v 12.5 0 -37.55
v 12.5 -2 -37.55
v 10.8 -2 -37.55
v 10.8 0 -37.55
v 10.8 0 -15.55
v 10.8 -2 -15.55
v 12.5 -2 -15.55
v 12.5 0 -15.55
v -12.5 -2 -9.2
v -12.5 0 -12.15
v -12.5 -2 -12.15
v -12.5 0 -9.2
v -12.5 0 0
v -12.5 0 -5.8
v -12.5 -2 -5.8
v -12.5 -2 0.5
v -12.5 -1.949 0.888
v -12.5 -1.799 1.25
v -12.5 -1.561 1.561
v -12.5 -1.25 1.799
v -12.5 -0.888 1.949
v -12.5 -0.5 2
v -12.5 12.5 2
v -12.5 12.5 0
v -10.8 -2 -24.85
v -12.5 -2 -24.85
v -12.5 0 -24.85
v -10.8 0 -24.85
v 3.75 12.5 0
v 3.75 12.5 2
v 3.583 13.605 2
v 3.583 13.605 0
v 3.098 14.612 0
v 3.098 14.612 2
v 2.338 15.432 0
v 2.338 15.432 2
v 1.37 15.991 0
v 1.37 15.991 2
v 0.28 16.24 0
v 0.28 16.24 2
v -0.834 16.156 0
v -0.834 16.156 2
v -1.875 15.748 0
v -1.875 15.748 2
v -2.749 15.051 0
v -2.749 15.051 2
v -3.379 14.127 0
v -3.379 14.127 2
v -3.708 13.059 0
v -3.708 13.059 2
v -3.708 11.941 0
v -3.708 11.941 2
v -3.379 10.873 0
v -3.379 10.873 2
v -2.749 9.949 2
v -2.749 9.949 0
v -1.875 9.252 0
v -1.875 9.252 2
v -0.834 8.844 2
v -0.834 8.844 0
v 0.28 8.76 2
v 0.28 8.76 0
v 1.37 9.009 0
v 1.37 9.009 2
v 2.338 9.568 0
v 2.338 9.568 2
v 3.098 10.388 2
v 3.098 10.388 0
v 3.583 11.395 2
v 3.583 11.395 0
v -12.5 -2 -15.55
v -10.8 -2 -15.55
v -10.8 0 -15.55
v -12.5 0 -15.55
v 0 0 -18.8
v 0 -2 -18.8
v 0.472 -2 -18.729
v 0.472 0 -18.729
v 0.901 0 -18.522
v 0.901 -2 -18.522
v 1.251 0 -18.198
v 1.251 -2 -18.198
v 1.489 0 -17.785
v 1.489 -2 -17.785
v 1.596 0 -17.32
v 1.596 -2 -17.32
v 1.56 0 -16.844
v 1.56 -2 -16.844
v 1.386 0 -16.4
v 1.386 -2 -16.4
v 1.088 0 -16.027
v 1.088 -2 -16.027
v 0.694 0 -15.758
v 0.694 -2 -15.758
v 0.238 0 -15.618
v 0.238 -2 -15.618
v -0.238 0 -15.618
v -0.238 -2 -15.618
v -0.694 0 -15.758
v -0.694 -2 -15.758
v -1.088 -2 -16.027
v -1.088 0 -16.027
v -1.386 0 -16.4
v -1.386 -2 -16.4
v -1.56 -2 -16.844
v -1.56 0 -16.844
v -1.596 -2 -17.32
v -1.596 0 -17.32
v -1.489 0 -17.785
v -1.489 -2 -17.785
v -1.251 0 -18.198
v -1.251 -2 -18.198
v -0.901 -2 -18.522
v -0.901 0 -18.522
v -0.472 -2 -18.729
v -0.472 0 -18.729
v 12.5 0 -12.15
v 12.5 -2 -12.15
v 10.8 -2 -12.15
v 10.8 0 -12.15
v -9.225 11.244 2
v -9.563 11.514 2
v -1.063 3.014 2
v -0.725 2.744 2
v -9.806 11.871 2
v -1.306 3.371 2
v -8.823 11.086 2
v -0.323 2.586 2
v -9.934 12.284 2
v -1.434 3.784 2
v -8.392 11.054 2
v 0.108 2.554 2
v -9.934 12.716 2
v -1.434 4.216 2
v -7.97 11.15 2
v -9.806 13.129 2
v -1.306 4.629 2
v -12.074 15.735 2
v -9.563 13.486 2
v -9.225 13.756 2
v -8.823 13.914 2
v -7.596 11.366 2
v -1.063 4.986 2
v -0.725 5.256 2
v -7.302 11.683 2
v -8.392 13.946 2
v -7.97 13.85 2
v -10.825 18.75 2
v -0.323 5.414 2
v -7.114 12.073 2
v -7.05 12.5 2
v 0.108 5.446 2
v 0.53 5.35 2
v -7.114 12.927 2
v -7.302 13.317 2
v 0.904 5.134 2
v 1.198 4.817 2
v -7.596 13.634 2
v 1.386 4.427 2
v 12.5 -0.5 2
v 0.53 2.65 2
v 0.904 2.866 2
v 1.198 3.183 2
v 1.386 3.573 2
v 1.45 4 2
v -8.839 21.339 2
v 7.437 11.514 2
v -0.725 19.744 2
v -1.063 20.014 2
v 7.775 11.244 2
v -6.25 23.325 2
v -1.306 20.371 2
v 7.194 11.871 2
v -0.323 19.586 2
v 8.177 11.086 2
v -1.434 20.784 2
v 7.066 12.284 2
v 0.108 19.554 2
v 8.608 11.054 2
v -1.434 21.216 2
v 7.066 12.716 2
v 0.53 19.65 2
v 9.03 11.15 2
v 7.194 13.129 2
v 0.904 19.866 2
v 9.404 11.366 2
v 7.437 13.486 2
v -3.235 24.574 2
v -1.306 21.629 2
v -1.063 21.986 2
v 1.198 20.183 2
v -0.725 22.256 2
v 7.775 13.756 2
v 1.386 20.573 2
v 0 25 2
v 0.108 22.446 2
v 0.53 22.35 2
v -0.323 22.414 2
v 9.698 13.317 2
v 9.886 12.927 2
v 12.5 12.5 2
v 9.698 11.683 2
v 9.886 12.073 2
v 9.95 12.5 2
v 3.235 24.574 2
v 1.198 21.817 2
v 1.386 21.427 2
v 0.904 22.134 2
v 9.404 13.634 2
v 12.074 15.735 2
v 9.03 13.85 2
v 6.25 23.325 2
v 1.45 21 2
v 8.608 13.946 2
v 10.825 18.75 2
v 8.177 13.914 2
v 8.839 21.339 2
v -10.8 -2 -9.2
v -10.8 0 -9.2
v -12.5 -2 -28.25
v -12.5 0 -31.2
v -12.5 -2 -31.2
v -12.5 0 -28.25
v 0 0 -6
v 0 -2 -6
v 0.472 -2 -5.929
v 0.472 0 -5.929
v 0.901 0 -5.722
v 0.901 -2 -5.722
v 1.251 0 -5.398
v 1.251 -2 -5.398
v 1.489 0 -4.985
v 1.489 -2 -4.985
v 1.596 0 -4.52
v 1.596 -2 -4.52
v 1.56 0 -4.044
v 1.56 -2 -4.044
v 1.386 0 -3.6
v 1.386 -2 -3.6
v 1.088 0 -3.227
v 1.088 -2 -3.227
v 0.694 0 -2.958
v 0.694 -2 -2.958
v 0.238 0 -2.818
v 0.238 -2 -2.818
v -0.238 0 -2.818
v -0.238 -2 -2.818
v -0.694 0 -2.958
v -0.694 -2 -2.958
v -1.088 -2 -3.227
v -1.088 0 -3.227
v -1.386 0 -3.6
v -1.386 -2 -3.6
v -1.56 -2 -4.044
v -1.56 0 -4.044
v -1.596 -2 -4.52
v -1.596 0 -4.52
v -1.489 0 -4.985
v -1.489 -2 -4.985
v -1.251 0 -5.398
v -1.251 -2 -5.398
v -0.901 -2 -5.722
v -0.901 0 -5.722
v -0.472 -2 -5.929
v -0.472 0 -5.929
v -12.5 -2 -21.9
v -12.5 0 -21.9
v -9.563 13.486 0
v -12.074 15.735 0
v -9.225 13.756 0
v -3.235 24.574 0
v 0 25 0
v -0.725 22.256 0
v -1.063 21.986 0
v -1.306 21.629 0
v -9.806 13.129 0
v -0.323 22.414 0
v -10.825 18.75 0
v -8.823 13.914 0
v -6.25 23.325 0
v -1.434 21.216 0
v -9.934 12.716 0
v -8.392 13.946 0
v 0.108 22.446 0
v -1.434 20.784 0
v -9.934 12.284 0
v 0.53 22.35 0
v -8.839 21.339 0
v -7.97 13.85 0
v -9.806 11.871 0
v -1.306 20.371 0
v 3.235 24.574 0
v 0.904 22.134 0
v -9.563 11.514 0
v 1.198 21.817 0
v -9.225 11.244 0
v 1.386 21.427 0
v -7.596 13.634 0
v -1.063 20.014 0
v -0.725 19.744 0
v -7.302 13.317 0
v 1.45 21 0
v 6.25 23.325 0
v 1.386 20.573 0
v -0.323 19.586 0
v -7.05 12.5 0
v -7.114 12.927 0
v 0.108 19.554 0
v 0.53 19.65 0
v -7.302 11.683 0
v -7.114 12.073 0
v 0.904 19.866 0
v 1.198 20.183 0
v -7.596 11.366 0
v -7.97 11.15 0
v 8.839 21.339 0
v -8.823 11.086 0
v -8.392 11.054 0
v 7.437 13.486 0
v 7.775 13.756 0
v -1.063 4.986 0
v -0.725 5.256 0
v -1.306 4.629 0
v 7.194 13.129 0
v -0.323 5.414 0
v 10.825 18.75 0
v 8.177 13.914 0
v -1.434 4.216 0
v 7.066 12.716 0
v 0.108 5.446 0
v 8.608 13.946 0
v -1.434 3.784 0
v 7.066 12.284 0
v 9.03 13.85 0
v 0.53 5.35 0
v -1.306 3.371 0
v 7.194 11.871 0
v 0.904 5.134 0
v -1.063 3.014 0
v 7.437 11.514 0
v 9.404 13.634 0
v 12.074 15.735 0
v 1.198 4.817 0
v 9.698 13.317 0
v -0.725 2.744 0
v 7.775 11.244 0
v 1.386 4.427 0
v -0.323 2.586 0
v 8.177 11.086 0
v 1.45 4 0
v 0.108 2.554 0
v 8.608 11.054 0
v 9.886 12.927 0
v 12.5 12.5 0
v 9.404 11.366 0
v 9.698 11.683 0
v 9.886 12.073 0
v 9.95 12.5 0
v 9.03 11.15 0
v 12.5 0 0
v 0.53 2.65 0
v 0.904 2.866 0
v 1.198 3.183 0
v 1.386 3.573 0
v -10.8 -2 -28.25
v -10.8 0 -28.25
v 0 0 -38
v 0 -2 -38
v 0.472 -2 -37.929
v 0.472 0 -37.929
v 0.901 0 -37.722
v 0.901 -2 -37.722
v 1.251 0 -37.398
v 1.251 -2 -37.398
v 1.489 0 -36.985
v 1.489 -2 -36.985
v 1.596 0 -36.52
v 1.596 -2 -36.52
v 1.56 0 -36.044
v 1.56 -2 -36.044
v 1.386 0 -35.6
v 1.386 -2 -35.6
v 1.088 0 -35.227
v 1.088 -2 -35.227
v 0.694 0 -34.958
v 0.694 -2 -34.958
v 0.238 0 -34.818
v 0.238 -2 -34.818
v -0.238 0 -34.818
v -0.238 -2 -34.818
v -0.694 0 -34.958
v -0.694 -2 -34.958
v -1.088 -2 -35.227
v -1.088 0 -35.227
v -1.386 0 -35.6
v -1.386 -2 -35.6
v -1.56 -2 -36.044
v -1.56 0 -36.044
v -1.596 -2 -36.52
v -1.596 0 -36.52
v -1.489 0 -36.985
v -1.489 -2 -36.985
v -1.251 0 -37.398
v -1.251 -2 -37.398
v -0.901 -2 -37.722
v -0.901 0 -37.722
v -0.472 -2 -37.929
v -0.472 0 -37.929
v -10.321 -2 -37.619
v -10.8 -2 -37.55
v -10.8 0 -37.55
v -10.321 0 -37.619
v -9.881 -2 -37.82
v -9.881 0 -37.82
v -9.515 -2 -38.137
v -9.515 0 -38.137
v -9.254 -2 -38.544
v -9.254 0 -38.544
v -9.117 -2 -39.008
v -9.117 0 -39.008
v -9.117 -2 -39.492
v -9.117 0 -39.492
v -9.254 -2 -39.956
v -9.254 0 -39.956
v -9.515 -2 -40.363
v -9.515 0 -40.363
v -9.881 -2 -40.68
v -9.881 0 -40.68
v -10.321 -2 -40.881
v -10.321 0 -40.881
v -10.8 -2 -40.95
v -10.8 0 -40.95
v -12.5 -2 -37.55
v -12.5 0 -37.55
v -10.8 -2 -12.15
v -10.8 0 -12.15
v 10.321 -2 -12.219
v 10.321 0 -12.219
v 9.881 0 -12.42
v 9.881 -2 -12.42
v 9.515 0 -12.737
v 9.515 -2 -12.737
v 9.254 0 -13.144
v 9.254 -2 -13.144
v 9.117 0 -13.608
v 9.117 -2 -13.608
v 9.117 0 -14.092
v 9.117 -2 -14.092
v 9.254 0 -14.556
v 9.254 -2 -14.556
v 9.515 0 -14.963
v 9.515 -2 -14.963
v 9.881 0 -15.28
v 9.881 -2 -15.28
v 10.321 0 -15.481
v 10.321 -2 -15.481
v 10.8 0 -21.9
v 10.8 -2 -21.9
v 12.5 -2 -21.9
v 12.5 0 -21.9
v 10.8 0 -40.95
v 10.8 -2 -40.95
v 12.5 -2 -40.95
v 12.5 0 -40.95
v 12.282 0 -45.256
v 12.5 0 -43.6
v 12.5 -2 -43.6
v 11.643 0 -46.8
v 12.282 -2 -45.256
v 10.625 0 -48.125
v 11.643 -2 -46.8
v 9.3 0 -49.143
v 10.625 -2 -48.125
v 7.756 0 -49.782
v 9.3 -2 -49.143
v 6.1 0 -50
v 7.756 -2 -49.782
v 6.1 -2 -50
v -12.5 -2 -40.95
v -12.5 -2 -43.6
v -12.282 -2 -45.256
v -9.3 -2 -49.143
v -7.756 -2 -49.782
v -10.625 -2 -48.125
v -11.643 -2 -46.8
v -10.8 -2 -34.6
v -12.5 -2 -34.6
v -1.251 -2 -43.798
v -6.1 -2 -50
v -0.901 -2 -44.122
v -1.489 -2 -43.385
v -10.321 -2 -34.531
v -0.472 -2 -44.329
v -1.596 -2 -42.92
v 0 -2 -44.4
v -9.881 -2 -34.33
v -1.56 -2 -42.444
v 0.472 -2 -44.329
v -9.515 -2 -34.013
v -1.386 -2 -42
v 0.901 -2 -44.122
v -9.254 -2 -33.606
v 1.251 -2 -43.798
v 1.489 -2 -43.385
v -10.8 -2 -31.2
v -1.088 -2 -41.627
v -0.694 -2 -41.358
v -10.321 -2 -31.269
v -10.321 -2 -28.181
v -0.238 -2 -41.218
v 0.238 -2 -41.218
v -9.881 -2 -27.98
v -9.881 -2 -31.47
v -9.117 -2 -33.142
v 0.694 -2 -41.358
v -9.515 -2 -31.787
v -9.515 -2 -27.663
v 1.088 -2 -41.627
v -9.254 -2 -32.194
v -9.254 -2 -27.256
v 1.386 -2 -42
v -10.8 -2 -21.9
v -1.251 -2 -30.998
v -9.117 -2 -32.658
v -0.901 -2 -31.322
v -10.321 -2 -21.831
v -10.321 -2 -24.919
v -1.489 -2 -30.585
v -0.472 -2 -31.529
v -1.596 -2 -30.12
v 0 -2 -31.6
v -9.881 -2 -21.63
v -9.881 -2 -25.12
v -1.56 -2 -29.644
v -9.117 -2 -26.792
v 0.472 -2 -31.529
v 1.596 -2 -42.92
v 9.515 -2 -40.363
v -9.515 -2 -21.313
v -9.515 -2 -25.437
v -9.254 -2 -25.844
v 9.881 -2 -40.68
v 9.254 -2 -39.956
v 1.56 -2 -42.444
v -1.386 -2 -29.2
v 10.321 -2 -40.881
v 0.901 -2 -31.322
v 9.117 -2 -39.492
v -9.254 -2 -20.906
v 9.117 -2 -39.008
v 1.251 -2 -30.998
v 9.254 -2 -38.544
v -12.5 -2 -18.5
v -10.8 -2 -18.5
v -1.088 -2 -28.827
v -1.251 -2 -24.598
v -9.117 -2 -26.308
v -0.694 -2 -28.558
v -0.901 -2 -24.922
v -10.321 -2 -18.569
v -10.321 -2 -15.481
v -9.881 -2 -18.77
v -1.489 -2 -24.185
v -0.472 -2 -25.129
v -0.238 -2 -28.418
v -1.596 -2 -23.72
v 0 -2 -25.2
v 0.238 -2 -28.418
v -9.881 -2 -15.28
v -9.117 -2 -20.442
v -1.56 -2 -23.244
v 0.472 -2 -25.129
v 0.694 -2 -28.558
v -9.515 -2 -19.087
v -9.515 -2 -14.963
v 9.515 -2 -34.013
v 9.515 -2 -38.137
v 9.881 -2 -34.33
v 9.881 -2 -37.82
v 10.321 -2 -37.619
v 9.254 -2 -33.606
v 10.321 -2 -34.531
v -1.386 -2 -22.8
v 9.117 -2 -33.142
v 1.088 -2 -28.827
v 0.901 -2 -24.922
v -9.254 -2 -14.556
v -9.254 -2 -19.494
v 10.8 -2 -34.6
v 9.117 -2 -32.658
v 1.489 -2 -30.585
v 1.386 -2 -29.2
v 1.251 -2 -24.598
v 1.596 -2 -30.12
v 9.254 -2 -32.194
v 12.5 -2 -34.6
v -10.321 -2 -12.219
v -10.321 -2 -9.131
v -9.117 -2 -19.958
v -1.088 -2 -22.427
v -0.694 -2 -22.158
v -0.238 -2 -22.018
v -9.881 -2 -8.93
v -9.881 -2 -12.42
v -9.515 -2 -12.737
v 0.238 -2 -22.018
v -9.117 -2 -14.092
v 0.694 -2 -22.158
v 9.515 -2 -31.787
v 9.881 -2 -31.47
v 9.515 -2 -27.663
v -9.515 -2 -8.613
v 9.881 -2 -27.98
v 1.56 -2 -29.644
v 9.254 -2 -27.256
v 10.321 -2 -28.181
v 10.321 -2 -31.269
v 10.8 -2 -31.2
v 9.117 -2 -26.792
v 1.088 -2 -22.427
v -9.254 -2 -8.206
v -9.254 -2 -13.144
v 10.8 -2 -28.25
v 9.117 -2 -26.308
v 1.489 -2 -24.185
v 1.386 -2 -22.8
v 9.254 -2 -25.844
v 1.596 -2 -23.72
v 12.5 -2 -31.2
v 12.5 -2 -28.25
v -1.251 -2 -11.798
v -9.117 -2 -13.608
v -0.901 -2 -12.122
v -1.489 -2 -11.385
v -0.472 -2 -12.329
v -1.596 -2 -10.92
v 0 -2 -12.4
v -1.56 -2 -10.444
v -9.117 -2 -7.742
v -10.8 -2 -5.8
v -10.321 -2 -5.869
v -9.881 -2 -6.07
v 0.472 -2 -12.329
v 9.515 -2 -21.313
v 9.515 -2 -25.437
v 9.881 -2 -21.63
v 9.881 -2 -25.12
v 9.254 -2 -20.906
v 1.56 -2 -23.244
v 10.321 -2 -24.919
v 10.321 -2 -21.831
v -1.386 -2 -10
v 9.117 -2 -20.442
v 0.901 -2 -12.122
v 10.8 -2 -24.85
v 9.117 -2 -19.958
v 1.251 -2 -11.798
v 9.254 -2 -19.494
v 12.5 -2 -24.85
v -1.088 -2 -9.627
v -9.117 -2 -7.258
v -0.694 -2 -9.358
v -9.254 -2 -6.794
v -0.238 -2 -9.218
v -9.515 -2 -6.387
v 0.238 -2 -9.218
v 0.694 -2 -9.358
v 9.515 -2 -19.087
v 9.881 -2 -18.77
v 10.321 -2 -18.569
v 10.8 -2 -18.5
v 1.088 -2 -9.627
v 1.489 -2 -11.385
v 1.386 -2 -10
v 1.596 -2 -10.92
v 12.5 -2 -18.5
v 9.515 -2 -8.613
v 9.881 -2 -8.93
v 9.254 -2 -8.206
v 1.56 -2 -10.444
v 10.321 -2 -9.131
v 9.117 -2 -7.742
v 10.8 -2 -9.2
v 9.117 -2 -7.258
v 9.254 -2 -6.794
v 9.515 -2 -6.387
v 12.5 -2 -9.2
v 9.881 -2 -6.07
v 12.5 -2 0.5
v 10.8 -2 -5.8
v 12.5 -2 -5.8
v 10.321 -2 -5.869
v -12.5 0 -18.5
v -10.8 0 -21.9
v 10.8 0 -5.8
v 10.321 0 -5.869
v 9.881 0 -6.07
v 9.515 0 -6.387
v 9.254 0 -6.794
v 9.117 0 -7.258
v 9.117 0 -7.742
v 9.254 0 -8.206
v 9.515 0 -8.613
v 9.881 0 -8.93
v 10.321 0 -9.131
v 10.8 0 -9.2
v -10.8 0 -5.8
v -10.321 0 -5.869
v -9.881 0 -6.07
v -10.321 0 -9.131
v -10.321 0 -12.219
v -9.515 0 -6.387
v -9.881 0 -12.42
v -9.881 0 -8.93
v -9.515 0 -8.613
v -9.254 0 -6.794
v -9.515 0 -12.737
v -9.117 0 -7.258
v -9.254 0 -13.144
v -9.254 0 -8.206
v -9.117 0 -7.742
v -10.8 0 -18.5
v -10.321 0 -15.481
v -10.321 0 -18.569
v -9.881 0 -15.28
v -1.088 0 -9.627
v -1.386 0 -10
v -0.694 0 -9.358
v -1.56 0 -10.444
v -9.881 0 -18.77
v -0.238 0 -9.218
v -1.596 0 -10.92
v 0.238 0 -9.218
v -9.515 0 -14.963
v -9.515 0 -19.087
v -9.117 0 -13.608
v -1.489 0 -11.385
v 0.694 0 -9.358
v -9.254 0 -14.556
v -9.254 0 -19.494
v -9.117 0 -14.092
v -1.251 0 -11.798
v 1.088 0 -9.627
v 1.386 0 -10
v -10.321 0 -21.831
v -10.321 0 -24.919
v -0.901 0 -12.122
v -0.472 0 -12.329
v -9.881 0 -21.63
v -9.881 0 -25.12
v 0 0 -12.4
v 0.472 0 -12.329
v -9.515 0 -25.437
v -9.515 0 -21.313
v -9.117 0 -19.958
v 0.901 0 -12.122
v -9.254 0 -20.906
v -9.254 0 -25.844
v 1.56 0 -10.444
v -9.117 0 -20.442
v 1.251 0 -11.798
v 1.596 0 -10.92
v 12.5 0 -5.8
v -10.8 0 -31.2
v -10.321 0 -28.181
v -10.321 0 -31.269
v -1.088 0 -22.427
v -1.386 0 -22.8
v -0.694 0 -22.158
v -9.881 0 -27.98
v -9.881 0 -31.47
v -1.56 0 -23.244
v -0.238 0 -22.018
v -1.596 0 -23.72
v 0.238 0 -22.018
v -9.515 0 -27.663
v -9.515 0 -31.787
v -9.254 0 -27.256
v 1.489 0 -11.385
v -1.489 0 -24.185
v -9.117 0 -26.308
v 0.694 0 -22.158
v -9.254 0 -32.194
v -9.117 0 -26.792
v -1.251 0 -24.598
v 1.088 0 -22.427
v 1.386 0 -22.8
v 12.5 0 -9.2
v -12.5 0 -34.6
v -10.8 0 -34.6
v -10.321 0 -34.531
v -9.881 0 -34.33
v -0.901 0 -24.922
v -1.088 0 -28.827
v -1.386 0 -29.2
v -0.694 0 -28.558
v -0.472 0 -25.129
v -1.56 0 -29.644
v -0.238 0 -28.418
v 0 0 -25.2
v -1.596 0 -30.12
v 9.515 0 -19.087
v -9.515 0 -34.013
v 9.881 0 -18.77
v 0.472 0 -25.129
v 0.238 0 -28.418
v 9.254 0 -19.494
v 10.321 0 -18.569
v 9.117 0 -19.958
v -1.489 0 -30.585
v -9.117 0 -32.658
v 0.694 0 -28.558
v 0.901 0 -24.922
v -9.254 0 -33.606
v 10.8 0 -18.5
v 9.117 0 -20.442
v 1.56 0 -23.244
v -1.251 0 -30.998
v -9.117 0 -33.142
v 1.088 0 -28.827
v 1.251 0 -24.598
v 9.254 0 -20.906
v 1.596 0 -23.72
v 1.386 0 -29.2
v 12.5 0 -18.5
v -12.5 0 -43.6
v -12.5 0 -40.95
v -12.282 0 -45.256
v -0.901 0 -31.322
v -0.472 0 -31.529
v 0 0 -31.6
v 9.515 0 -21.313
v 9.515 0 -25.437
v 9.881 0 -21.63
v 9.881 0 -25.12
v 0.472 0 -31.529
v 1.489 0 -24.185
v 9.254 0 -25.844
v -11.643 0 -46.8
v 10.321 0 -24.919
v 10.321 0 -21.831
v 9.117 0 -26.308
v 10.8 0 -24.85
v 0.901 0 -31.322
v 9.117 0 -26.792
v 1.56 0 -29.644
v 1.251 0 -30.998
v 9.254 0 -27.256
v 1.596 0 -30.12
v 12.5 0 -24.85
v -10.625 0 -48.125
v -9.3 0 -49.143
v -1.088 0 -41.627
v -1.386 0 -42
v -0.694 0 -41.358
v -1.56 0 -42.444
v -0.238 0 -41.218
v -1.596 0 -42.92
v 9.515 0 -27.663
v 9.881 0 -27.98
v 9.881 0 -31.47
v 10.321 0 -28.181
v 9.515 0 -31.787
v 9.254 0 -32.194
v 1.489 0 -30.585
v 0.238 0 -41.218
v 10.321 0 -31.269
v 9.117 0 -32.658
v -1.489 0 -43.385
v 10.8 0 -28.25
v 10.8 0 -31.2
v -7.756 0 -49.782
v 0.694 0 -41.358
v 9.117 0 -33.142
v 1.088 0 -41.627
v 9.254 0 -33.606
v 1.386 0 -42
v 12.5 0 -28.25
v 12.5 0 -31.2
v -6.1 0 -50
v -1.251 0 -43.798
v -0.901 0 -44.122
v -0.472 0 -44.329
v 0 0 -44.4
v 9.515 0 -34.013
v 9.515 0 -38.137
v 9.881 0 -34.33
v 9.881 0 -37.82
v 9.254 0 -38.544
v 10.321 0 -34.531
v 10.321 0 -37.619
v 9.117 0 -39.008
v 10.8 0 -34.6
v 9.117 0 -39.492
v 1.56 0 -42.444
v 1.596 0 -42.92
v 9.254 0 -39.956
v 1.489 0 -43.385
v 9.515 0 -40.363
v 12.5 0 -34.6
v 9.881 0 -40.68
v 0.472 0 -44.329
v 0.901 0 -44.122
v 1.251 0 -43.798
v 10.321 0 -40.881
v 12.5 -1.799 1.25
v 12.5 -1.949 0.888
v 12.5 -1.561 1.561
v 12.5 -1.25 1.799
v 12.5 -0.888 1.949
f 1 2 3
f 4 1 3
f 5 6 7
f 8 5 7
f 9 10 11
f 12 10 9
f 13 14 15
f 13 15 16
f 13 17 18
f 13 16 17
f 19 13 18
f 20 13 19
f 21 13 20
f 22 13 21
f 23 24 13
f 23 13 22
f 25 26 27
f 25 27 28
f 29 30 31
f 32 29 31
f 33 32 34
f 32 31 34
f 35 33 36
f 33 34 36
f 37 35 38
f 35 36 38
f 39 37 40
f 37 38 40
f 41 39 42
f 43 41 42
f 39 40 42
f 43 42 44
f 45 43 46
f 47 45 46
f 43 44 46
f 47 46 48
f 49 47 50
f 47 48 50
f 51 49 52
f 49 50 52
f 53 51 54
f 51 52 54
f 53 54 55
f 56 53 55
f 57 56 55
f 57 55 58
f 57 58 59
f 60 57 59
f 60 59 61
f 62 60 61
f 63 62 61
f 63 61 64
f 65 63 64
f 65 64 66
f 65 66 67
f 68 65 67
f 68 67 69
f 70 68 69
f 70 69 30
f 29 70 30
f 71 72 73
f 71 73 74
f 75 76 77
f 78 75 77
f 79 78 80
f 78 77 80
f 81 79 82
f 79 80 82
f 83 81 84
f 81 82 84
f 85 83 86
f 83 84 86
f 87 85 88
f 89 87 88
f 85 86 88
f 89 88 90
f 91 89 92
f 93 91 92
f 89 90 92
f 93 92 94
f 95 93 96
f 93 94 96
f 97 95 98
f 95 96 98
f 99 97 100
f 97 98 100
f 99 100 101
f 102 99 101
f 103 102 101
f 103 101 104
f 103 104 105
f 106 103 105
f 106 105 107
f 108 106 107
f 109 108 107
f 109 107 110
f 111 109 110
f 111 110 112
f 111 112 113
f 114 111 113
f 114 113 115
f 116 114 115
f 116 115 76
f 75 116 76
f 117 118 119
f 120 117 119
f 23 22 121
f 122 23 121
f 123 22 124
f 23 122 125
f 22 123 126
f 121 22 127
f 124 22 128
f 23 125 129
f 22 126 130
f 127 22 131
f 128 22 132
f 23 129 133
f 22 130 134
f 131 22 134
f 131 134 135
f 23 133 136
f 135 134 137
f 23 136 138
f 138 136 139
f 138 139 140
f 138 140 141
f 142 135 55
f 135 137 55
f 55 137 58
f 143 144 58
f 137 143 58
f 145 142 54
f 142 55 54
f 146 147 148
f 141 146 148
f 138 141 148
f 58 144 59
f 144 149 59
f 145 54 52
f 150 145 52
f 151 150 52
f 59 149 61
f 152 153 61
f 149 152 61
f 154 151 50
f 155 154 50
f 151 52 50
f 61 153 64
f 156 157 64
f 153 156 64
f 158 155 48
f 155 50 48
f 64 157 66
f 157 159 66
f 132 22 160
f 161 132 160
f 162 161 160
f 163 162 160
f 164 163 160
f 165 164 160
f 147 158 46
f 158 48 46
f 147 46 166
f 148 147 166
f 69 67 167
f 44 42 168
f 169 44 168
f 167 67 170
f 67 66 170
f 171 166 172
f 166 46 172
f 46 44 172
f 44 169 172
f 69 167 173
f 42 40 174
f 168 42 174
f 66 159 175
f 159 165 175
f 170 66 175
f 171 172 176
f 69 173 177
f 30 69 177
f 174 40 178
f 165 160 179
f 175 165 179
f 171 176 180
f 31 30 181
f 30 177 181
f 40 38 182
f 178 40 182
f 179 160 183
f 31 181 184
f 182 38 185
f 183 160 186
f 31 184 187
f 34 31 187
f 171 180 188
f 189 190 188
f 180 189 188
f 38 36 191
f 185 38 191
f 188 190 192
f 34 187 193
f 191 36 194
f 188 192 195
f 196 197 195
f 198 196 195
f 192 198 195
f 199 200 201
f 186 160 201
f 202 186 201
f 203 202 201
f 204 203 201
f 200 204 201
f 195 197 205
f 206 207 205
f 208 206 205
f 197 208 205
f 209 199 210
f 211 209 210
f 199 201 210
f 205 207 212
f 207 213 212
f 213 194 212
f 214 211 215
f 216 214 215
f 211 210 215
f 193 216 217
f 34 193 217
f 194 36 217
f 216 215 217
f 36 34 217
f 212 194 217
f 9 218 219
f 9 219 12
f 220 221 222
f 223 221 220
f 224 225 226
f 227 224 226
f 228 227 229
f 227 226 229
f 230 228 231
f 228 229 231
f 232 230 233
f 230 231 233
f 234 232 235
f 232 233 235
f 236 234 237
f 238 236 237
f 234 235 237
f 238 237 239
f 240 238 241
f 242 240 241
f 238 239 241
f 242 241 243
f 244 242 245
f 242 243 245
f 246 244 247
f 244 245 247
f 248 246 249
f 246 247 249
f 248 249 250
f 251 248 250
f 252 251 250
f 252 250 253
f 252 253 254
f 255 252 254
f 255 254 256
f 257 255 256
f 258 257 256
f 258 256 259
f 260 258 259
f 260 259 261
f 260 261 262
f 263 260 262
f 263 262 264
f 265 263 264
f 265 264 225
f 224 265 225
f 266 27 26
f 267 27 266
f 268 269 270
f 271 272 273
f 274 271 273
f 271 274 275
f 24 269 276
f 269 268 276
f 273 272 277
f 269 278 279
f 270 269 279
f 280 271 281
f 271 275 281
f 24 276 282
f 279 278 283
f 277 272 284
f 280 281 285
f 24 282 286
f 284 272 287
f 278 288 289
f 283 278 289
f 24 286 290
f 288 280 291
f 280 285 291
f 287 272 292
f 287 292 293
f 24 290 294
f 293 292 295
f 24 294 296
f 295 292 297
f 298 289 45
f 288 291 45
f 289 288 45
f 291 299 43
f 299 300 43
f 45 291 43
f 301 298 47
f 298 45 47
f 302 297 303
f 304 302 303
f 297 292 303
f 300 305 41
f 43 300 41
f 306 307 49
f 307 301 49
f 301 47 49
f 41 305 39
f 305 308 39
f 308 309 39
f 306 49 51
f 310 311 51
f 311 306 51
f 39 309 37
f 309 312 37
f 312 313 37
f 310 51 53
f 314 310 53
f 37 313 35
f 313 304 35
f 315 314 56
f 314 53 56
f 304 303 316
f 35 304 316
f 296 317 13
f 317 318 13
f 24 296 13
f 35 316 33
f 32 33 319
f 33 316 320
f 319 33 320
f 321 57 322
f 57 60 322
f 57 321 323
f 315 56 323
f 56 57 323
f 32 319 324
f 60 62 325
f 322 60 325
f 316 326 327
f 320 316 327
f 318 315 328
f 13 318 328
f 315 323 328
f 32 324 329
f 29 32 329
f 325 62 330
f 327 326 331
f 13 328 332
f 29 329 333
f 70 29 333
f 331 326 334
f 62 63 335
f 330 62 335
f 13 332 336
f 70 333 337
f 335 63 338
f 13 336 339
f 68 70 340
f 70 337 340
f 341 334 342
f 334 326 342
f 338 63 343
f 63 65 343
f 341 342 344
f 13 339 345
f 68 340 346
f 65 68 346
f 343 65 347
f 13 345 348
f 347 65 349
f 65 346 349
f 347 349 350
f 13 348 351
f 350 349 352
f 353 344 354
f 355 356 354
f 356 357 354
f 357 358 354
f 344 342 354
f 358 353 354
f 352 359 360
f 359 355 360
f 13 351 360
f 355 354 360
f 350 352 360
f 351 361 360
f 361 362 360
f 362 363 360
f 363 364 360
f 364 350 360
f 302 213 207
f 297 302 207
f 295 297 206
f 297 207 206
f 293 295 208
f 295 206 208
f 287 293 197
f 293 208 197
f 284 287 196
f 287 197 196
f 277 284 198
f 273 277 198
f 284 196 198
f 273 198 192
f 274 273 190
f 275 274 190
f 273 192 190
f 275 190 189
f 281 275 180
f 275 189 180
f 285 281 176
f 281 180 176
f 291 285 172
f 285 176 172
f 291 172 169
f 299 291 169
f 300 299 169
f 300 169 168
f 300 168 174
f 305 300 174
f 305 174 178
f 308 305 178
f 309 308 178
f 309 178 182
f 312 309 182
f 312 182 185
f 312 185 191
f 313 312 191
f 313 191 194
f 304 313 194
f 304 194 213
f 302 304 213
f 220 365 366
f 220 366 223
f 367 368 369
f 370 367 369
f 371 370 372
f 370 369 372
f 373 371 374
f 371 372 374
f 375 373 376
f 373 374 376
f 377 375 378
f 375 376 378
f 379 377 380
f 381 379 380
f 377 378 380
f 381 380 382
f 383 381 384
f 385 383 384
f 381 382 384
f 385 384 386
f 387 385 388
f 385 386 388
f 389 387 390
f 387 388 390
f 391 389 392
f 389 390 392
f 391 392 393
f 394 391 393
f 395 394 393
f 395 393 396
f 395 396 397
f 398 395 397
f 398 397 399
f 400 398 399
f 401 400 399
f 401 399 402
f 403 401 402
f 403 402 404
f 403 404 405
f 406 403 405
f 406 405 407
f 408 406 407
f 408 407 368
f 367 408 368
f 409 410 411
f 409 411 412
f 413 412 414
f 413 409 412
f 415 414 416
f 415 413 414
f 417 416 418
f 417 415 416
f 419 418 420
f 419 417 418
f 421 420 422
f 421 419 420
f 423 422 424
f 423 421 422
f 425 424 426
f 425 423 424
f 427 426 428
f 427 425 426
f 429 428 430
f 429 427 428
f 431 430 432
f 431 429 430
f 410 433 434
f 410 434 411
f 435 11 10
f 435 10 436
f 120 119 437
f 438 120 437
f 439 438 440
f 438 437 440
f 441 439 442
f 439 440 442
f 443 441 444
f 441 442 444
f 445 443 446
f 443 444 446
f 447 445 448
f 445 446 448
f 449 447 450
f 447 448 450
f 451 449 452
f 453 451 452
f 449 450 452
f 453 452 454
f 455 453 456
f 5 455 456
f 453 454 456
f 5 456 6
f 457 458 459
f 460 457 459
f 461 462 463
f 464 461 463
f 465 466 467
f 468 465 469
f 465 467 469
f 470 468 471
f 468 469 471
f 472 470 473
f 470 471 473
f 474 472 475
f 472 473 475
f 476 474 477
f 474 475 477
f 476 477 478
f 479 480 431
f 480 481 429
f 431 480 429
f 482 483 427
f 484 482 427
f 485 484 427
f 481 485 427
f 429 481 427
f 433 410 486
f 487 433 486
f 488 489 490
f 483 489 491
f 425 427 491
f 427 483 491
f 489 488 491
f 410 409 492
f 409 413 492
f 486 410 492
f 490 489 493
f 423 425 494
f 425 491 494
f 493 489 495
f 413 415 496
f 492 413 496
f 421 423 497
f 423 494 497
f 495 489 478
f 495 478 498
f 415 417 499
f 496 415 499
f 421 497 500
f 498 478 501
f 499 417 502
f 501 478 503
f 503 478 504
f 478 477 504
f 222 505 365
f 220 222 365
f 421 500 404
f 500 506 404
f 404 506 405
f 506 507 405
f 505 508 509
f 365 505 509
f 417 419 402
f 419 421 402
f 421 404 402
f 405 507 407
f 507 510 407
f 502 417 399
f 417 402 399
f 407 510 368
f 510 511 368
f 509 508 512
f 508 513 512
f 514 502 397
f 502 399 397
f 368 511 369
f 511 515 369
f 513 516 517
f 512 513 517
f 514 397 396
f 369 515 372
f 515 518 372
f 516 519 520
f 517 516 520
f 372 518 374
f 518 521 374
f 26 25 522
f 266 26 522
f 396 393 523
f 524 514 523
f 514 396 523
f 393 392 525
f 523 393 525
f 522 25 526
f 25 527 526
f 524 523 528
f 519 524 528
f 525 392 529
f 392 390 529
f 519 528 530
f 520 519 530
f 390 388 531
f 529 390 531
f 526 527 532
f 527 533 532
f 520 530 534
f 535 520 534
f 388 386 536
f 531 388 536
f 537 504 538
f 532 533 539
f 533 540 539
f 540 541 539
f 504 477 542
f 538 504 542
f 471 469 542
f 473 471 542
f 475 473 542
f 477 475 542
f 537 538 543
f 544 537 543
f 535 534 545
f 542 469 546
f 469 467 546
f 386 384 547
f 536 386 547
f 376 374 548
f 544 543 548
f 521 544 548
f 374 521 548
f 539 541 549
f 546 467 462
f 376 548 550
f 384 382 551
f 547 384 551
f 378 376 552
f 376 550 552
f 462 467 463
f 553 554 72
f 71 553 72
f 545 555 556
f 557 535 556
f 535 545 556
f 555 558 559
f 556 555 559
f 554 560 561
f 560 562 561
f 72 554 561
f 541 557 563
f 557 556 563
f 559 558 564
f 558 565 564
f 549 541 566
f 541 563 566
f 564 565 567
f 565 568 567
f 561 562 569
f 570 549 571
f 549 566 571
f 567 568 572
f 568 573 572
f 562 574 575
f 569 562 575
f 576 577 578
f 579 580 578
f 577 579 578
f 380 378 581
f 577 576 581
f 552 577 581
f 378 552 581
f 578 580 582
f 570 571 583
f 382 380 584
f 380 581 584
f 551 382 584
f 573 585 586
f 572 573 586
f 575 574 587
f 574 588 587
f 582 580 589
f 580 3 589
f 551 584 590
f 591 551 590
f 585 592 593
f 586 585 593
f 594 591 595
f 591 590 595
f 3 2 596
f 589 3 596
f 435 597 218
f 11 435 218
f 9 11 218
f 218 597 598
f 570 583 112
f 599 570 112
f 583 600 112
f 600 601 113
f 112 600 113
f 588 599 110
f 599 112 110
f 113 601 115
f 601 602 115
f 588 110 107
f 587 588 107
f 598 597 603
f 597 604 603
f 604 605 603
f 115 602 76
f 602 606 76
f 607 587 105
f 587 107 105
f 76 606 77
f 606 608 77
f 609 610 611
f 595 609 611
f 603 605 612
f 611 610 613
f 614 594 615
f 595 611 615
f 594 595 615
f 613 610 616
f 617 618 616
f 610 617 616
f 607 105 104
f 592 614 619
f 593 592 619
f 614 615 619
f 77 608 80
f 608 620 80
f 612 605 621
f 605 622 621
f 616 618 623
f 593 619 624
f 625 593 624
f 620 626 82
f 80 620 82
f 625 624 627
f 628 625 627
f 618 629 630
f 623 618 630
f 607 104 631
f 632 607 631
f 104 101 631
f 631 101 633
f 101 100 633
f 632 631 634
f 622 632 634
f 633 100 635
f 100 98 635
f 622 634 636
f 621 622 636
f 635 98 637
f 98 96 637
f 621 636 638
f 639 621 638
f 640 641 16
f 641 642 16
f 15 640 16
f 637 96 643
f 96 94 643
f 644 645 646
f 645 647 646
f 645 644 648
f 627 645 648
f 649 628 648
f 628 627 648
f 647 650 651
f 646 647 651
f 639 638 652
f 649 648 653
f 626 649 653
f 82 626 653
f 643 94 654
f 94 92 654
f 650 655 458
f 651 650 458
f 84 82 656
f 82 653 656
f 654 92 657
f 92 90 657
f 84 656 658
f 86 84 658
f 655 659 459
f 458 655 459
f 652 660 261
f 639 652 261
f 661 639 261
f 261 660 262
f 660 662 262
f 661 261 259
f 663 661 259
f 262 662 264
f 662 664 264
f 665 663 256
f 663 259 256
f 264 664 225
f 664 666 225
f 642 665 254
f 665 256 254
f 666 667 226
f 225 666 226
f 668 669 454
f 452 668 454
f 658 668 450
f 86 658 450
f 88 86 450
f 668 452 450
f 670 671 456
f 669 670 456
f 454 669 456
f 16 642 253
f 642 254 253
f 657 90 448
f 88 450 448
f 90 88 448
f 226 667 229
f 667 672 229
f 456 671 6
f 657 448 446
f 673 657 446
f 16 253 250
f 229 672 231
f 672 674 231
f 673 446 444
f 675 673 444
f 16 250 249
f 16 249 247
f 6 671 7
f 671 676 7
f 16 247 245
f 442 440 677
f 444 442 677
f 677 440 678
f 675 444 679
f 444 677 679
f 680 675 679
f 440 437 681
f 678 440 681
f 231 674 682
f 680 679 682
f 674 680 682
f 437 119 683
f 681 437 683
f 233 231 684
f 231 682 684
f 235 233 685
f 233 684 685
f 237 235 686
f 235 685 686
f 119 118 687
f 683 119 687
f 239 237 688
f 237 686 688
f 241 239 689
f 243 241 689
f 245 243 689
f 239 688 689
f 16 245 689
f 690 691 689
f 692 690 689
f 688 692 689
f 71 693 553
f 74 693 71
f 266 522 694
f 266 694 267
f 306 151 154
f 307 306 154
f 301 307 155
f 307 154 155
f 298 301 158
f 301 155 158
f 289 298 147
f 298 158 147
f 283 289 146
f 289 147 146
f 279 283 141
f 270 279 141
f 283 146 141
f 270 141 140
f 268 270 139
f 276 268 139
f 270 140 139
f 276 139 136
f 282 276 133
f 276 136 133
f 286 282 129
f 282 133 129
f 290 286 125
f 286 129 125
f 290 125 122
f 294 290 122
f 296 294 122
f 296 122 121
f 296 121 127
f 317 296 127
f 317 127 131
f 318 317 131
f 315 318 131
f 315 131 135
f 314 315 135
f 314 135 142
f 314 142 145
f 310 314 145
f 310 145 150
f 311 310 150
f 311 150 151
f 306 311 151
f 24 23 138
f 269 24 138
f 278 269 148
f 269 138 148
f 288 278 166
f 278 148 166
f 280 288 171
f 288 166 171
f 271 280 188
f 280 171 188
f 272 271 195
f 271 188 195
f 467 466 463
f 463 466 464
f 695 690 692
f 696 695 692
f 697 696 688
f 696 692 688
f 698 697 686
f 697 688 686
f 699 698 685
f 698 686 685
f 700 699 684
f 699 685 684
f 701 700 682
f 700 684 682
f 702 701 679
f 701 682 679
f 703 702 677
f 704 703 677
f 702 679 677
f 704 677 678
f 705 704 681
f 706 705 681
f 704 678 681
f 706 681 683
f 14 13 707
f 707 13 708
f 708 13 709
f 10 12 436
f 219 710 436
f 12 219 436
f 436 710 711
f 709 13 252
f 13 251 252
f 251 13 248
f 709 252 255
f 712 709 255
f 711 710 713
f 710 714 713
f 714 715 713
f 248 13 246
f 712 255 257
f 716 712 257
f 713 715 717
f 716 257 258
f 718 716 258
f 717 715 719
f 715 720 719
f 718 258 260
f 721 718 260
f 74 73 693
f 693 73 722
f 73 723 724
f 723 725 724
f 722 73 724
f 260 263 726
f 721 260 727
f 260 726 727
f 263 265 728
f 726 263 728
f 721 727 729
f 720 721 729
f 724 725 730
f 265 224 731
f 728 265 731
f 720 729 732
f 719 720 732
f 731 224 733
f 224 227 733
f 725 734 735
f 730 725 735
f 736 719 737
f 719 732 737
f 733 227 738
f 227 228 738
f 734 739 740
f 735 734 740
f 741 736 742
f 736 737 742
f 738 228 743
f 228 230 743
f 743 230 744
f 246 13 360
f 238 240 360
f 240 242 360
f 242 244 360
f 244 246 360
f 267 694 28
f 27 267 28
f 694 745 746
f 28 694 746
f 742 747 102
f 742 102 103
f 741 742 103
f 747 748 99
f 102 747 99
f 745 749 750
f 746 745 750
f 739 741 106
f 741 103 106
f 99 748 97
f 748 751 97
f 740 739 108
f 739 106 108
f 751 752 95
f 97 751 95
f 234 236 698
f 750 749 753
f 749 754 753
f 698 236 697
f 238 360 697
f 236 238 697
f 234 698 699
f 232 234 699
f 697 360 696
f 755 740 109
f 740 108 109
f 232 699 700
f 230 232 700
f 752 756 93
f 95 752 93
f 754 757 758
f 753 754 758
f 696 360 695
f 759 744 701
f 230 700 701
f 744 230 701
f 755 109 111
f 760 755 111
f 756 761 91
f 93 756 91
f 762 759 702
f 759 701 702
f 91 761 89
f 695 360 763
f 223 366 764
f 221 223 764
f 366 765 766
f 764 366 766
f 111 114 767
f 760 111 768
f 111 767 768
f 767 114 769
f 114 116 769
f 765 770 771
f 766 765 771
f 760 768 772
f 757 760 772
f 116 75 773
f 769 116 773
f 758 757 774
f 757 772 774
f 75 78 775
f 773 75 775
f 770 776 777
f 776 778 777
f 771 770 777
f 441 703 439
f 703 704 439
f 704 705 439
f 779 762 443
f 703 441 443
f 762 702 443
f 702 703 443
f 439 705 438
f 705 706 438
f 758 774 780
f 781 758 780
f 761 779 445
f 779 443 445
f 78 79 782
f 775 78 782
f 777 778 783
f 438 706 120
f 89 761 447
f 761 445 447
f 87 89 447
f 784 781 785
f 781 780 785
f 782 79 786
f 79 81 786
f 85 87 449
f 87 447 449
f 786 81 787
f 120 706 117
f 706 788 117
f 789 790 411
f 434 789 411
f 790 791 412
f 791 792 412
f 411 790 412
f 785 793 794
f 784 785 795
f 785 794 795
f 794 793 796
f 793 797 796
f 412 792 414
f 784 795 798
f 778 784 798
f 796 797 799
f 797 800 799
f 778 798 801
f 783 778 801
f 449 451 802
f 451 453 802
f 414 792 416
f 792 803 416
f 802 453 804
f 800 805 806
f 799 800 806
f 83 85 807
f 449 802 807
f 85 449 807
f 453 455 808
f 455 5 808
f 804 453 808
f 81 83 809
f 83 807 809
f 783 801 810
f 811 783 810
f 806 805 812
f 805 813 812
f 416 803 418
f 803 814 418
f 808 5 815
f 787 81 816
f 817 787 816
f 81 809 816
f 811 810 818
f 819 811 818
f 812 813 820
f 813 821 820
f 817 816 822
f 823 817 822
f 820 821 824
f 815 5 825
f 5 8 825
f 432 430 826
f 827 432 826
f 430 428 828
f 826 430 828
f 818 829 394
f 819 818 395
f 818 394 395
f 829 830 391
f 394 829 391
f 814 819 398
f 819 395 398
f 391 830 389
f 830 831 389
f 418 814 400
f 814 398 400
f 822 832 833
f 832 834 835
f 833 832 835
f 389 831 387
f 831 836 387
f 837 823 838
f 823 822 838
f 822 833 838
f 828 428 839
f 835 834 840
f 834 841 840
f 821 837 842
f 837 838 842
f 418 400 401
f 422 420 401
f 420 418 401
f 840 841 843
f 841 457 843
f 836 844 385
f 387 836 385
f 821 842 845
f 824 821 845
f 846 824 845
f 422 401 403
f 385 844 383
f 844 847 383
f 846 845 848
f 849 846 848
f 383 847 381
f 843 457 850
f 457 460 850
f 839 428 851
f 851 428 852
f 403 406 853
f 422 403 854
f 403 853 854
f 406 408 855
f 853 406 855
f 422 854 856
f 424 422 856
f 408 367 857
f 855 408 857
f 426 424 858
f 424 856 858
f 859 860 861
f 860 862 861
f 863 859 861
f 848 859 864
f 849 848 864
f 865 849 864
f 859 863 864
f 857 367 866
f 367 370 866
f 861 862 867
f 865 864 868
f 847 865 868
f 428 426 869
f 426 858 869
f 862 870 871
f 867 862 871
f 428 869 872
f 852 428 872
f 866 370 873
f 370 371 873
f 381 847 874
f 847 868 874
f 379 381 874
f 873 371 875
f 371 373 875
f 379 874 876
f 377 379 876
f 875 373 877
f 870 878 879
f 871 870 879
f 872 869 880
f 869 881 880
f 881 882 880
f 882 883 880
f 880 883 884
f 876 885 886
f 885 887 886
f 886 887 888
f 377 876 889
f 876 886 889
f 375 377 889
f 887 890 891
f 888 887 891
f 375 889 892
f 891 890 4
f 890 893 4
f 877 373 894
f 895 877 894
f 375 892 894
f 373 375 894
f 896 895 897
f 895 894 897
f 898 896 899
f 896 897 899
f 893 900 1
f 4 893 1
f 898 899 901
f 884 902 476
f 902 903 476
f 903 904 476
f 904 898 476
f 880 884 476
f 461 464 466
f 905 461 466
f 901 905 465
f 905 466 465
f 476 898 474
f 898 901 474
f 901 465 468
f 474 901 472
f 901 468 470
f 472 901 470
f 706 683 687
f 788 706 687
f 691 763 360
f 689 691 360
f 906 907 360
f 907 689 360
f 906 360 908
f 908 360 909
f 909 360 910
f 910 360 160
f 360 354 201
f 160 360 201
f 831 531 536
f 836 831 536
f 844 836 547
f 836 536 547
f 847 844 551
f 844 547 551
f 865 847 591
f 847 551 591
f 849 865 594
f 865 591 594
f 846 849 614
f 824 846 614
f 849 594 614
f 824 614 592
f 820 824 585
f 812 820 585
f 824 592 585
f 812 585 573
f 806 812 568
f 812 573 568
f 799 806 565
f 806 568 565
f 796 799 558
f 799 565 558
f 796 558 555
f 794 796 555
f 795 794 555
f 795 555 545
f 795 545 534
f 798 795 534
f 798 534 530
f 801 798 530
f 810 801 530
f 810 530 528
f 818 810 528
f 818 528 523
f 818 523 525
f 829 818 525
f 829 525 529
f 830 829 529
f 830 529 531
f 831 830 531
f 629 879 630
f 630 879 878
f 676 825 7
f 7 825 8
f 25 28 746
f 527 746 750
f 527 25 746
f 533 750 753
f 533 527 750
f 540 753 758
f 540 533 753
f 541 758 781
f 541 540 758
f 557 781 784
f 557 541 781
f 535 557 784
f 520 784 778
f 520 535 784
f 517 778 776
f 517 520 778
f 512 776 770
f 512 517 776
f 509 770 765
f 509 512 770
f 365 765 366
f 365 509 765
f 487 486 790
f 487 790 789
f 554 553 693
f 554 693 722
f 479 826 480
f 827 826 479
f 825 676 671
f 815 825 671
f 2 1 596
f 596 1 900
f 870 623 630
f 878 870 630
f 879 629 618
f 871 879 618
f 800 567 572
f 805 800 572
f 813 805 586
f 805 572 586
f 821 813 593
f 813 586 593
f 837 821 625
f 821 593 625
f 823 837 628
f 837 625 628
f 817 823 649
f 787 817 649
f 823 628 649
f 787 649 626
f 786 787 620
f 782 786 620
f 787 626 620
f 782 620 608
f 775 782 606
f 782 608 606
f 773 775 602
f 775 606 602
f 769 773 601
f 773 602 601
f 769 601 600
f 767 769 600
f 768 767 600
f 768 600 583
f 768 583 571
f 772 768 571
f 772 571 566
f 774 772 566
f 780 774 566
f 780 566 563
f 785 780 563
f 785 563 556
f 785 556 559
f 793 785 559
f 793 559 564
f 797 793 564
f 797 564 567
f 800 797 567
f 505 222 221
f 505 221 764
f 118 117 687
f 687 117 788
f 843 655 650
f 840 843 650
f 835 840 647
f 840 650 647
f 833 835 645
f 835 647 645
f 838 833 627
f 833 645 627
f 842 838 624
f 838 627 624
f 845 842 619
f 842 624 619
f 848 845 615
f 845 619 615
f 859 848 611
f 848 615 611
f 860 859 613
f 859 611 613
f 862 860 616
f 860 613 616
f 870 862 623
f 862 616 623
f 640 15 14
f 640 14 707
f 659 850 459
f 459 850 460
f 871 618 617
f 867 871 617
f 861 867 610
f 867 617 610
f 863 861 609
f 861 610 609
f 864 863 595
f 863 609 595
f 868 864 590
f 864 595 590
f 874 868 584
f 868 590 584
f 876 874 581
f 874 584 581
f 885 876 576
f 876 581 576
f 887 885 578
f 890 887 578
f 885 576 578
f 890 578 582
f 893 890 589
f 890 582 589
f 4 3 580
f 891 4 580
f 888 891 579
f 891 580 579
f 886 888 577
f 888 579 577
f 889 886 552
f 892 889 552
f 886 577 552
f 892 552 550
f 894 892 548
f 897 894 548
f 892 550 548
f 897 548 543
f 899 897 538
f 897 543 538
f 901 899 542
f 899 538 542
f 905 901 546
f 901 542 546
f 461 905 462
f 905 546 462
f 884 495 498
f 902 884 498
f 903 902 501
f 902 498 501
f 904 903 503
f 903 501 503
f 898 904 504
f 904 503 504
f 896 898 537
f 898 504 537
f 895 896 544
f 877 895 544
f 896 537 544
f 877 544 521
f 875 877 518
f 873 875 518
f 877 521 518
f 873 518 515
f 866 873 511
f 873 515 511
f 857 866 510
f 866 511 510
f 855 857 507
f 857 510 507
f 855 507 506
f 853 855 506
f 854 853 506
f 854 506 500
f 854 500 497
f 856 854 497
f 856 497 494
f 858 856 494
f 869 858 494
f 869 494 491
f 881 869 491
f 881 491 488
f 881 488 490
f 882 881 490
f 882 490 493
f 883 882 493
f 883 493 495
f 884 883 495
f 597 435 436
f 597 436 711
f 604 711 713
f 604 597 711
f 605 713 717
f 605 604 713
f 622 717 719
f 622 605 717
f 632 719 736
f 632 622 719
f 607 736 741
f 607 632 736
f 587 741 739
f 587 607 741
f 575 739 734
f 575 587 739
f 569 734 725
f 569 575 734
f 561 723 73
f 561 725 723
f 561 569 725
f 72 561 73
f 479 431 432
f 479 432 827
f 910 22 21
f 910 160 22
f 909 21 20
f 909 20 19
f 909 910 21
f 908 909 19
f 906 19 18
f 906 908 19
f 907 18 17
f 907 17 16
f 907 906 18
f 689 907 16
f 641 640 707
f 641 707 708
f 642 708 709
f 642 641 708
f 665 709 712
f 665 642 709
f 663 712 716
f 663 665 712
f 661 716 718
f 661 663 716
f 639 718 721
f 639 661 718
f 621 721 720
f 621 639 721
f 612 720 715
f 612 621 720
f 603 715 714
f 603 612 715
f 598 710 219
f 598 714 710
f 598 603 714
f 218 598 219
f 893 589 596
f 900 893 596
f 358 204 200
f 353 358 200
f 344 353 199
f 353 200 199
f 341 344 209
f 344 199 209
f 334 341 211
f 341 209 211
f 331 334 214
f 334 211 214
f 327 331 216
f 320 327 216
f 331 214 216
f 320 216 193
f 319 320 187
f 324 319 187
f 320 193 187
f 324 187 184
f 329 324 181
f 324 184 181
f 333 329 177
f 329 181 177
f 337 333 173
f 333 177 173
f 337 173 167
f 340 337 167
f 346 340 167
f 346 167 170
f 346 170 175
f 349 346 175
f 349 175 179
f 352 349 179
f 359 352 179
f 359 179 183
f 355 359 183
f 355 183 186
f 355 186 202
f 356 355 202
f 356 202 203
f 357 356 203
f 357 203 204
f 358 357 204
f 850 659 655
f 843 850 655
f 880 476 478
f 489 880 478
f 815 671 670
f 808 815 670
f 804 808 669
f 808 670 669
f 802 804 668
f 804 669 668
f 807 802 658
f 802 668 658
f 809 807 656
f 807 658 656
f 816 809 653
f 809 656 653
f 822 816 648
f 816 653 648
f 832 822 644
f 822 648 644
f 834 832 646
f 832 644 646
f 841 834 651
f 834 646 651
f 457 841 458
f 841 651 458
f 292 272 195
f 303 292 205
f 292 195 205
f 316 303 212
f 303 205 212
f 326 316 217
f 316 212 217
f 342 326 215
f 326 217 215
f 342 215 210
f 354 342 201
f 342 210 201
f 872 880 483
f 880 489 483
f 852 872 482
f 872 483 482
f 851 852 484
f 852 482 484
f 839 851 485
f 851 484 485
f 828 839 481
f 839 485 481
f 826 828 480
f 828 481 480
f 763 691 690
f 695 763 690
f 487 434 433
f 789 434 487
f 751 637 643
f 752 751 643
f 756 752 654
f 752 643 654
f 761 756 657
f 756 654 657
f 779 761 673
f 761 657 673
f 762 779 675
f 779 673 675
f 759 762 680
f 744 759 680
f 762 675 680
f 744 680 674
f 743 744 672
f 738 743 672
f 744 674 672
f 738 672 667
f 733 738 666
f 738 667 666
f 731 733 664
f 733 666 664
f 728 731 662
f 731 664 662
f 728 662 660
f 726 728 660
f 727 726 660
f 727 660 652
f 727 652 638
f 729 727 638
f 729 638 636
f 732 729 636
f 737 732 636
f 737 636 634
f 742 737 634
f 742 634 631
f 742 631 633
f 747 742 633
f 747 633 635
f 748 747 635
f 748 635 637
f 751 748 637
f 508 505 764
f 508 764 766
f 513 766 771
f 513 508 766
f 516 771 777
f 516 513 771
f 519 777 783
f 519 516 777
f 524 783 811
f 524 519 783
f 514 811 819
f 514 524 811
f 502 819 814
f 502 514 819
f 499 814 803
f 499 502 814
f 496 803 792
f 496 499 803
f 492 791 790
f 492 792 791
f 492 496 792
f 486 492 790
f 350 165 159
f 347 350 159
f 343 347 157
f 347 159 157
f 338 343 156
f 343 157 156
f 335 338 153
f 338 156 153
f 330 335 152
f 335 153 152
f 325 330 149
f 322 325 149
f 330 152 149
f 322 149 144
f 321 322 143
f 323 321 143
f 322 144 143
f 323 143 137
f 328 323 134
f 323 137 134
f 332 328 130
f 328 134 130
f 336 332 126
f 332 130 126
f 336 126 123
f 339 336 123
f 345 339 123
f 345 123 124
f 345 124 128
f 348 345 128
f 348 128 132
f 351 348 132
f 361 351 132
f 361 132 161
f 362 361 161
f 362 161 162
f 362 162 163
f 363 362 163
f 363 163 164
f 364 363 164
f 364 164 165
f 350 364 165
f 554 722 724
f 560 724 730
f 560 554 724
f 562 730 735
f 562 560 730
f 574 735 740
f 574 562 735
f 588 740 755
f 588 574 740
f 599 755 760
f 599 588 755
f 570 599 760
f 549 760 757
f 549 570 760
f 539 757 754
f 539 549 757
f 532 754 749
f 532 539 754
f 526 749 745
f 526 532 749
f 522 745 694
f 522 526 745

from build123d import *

# Parameters (mm, degrees)
BOSS_EXTRUDE1_DEPTH = 12.5
FILLET1_R           = 1.5
SKETCH3_R           = 1.45
SKETCH3_R_2         = 3.75
CUT_EXTRUDE1_DEPTH  = 60.036005962
SKETCH5_R           = 1.6
CUT_EXTRUDE2_DEPTH  = 59.182901268
CUT_EXTRUDE3_DEPTH  = 59.182901268
FILLET2_R           = 6.4


with BuildPart() as part:
    # Sketch1 → Boss-Extrude1 (new, symmetric)
    with BuildSketch(Plane(origin=(0, 0, 0), x_dir=(0, 0, -1), z_dir=(1, 0, 0))):
        Polygon((0, 25), (0, 0), (50, 0), (50, -2), (-2, -2), (-2, 25), align=None)
    extrude(amount=BOSS_EXTRUDE1_DEPTH, both=True)

    # Fillet1
    fillet1_edges = [part.edges().sort_by_distance(p)[0] for p in [
        (0, -2, 2),
    ]]
    fillet(fillet1_edges, radius=FILLET1_R)

    # Sketch3 → Cut-Extrude1 (cut, through all)
    with BuildSketch(Plane.XY.offset(2)):
        with BuildLine():
            ThreePointArc((-12.5, 12.5), (-8.838834765, 21.338834765), (0, 25))
            Line((0, 25), (-12.5, 25))
            Line((-12.5, 25), (-12.5, 12.5))
        make_face()
        with BuildLine():
            ThreePointArc((0, 25), (8.838834765, 21.338834765), (12.5, 12.5))
            Line((12.5, 12.5), (12.5, 25))
            Line((12.5, 25), (0, 25))
        make_face()
        with Locations((0, 21)):
            Circle(SKETCH3_R)
        with Locations((0, 12.5)):
            Circle(SKETCH3_R_2)
        with Locations((-8.5, 12.5)):
            Circle(SKETCH3_R)
        with Locations((0, 4)):
            Circle(SKETCH3_R)
        with Locations((8.5, 12.5)):
            Circle(SKETCH3_R)
    extrude(amount=-CUT_EXTRUDE1_DEPTH, mode=Mode.SUBTRACT)

    # Sketch5 → Cut-Extrude2 (cut, through all)
    with BuildSketch(Plane.XZ.offset(2)):
        with Locations(Location((0, -42.8, 0), (0, 0, 270))):
            Circle(SKETCH5_R)
        with Locations(Location((0, -36.4, 0), (0, 0, 270))):
            Circle(SKETCH5_R)
        with Locations(Location((0, -30, 0), (0, 0, 270))):
            Circle(SKETCH5_R)
        with Locations(Location((0, -23.6, 0), (0, 0, 270))):
            Circle(SKETCH5_R)
        with Locations(Location((0, -17.2, 0), (0, 0, 270))):
            Circle(SKETCH5_R)
        with Locations(Location((0, -10.8, 0), (0, 0, 270))):
            Circle(SKETCH5_R)
        with Locations(Location((0, -4.4, 0), (0, 0, 270))):
            Circle(SKETCH5_R)
    extrude(amount=-CUT_EXTRUDE2_DEPTH, mode=Mode.SUBTRACT)

    # Sketch6 → Cut-Extrude3 (cut, through all)
    with BuildSketch(Plane.XZ.offset(2)):
        with BuildLine():
            Line((12.5, -40.95), (12.5, -37.55))
            Line((12.5, -37.55), (10.8, -37.55))
            ThreePointArc((10.8, -37.55), (9.1, -39.25), (10.8, -40.95))
            Line((10.8, -40.95), (12.5, -40.95))
        make_face()
        with BuildLine():
            Line((10.8, -34.6), (12.5, -34.6))
            Line((12.5, -34.6), (12.5, -31.2))
            Line((12.5, -31.2), (10.8, -31.2))
            ThreePointArc((10.8, -31.2), (9.1, -32.9), (10.8, -34.6))
        make_face()
        with BuildLine():
            Line((12.5, -5.8), (10.8, -5.8))
            ThreePointArc((10.8, -5.8), (9.1, -7.5), (10.8, -9.2))
            Line((10.8, -9.2), (12.5, -9.2))
            Line((12.5, -9.2), (12.5, -5.8))
        make_face()
        with BuildLine():
            Line((10.8, -28.25), (12.5, -28.25))
            Line((12.5, -28.25), (12.5, -24.85))
            Line((12.5, -24.85), (10.8, -24.85))
            ThreePointArc((10.8, -24.85), (9.1, -26.55), (10.8, -28.25))
        make_face()
        with BuildLine():
            Line((12.5, -12.15), (10.8, -12.15))
            ThreePointArc((10.8, -12.15), (9.1, -13.85), (10.8, -15.55))
            Line((10.8, -15.55), (12.5, -15.55))
            Line((12.5, -15.55), (12.5, -12.15))
        make_face()
        with BuildLine():
            Line((10.8, -21.9), (12.5, -21.9))
            Line((12.5, -21.9), (12.5, -18.5))
            Line((12.5, -18.5), (10.8, -18.5))
            ThreePointArc((10.8, -18.5), (9.1, -20.2), (10.8, -21.9))
        make_face()
    cut_extrude3 = extrude(amount=-CUT_EXTRUDE3_DEPTH, mode=Mode.SUBTRACT)

    # Mirror1: Cut-Extrude3 across plane
    add(cut_extrude3.mirror(Plane(origin=(0, 0, 0), x_dir=(0, 0, 1), z_dir=(1, 0, 0))), mode=Mode.SUBTRACT)

    # Fillet2
    fillet2_edges = [part.edges().sort_by_distance(p)[0] for p in [
        (12.5, -1, -50),
        (-12.5, -1, -50),
    ]]
    fillet(fillet2_edges, radius=FILLET2_R)


solid = part.part
